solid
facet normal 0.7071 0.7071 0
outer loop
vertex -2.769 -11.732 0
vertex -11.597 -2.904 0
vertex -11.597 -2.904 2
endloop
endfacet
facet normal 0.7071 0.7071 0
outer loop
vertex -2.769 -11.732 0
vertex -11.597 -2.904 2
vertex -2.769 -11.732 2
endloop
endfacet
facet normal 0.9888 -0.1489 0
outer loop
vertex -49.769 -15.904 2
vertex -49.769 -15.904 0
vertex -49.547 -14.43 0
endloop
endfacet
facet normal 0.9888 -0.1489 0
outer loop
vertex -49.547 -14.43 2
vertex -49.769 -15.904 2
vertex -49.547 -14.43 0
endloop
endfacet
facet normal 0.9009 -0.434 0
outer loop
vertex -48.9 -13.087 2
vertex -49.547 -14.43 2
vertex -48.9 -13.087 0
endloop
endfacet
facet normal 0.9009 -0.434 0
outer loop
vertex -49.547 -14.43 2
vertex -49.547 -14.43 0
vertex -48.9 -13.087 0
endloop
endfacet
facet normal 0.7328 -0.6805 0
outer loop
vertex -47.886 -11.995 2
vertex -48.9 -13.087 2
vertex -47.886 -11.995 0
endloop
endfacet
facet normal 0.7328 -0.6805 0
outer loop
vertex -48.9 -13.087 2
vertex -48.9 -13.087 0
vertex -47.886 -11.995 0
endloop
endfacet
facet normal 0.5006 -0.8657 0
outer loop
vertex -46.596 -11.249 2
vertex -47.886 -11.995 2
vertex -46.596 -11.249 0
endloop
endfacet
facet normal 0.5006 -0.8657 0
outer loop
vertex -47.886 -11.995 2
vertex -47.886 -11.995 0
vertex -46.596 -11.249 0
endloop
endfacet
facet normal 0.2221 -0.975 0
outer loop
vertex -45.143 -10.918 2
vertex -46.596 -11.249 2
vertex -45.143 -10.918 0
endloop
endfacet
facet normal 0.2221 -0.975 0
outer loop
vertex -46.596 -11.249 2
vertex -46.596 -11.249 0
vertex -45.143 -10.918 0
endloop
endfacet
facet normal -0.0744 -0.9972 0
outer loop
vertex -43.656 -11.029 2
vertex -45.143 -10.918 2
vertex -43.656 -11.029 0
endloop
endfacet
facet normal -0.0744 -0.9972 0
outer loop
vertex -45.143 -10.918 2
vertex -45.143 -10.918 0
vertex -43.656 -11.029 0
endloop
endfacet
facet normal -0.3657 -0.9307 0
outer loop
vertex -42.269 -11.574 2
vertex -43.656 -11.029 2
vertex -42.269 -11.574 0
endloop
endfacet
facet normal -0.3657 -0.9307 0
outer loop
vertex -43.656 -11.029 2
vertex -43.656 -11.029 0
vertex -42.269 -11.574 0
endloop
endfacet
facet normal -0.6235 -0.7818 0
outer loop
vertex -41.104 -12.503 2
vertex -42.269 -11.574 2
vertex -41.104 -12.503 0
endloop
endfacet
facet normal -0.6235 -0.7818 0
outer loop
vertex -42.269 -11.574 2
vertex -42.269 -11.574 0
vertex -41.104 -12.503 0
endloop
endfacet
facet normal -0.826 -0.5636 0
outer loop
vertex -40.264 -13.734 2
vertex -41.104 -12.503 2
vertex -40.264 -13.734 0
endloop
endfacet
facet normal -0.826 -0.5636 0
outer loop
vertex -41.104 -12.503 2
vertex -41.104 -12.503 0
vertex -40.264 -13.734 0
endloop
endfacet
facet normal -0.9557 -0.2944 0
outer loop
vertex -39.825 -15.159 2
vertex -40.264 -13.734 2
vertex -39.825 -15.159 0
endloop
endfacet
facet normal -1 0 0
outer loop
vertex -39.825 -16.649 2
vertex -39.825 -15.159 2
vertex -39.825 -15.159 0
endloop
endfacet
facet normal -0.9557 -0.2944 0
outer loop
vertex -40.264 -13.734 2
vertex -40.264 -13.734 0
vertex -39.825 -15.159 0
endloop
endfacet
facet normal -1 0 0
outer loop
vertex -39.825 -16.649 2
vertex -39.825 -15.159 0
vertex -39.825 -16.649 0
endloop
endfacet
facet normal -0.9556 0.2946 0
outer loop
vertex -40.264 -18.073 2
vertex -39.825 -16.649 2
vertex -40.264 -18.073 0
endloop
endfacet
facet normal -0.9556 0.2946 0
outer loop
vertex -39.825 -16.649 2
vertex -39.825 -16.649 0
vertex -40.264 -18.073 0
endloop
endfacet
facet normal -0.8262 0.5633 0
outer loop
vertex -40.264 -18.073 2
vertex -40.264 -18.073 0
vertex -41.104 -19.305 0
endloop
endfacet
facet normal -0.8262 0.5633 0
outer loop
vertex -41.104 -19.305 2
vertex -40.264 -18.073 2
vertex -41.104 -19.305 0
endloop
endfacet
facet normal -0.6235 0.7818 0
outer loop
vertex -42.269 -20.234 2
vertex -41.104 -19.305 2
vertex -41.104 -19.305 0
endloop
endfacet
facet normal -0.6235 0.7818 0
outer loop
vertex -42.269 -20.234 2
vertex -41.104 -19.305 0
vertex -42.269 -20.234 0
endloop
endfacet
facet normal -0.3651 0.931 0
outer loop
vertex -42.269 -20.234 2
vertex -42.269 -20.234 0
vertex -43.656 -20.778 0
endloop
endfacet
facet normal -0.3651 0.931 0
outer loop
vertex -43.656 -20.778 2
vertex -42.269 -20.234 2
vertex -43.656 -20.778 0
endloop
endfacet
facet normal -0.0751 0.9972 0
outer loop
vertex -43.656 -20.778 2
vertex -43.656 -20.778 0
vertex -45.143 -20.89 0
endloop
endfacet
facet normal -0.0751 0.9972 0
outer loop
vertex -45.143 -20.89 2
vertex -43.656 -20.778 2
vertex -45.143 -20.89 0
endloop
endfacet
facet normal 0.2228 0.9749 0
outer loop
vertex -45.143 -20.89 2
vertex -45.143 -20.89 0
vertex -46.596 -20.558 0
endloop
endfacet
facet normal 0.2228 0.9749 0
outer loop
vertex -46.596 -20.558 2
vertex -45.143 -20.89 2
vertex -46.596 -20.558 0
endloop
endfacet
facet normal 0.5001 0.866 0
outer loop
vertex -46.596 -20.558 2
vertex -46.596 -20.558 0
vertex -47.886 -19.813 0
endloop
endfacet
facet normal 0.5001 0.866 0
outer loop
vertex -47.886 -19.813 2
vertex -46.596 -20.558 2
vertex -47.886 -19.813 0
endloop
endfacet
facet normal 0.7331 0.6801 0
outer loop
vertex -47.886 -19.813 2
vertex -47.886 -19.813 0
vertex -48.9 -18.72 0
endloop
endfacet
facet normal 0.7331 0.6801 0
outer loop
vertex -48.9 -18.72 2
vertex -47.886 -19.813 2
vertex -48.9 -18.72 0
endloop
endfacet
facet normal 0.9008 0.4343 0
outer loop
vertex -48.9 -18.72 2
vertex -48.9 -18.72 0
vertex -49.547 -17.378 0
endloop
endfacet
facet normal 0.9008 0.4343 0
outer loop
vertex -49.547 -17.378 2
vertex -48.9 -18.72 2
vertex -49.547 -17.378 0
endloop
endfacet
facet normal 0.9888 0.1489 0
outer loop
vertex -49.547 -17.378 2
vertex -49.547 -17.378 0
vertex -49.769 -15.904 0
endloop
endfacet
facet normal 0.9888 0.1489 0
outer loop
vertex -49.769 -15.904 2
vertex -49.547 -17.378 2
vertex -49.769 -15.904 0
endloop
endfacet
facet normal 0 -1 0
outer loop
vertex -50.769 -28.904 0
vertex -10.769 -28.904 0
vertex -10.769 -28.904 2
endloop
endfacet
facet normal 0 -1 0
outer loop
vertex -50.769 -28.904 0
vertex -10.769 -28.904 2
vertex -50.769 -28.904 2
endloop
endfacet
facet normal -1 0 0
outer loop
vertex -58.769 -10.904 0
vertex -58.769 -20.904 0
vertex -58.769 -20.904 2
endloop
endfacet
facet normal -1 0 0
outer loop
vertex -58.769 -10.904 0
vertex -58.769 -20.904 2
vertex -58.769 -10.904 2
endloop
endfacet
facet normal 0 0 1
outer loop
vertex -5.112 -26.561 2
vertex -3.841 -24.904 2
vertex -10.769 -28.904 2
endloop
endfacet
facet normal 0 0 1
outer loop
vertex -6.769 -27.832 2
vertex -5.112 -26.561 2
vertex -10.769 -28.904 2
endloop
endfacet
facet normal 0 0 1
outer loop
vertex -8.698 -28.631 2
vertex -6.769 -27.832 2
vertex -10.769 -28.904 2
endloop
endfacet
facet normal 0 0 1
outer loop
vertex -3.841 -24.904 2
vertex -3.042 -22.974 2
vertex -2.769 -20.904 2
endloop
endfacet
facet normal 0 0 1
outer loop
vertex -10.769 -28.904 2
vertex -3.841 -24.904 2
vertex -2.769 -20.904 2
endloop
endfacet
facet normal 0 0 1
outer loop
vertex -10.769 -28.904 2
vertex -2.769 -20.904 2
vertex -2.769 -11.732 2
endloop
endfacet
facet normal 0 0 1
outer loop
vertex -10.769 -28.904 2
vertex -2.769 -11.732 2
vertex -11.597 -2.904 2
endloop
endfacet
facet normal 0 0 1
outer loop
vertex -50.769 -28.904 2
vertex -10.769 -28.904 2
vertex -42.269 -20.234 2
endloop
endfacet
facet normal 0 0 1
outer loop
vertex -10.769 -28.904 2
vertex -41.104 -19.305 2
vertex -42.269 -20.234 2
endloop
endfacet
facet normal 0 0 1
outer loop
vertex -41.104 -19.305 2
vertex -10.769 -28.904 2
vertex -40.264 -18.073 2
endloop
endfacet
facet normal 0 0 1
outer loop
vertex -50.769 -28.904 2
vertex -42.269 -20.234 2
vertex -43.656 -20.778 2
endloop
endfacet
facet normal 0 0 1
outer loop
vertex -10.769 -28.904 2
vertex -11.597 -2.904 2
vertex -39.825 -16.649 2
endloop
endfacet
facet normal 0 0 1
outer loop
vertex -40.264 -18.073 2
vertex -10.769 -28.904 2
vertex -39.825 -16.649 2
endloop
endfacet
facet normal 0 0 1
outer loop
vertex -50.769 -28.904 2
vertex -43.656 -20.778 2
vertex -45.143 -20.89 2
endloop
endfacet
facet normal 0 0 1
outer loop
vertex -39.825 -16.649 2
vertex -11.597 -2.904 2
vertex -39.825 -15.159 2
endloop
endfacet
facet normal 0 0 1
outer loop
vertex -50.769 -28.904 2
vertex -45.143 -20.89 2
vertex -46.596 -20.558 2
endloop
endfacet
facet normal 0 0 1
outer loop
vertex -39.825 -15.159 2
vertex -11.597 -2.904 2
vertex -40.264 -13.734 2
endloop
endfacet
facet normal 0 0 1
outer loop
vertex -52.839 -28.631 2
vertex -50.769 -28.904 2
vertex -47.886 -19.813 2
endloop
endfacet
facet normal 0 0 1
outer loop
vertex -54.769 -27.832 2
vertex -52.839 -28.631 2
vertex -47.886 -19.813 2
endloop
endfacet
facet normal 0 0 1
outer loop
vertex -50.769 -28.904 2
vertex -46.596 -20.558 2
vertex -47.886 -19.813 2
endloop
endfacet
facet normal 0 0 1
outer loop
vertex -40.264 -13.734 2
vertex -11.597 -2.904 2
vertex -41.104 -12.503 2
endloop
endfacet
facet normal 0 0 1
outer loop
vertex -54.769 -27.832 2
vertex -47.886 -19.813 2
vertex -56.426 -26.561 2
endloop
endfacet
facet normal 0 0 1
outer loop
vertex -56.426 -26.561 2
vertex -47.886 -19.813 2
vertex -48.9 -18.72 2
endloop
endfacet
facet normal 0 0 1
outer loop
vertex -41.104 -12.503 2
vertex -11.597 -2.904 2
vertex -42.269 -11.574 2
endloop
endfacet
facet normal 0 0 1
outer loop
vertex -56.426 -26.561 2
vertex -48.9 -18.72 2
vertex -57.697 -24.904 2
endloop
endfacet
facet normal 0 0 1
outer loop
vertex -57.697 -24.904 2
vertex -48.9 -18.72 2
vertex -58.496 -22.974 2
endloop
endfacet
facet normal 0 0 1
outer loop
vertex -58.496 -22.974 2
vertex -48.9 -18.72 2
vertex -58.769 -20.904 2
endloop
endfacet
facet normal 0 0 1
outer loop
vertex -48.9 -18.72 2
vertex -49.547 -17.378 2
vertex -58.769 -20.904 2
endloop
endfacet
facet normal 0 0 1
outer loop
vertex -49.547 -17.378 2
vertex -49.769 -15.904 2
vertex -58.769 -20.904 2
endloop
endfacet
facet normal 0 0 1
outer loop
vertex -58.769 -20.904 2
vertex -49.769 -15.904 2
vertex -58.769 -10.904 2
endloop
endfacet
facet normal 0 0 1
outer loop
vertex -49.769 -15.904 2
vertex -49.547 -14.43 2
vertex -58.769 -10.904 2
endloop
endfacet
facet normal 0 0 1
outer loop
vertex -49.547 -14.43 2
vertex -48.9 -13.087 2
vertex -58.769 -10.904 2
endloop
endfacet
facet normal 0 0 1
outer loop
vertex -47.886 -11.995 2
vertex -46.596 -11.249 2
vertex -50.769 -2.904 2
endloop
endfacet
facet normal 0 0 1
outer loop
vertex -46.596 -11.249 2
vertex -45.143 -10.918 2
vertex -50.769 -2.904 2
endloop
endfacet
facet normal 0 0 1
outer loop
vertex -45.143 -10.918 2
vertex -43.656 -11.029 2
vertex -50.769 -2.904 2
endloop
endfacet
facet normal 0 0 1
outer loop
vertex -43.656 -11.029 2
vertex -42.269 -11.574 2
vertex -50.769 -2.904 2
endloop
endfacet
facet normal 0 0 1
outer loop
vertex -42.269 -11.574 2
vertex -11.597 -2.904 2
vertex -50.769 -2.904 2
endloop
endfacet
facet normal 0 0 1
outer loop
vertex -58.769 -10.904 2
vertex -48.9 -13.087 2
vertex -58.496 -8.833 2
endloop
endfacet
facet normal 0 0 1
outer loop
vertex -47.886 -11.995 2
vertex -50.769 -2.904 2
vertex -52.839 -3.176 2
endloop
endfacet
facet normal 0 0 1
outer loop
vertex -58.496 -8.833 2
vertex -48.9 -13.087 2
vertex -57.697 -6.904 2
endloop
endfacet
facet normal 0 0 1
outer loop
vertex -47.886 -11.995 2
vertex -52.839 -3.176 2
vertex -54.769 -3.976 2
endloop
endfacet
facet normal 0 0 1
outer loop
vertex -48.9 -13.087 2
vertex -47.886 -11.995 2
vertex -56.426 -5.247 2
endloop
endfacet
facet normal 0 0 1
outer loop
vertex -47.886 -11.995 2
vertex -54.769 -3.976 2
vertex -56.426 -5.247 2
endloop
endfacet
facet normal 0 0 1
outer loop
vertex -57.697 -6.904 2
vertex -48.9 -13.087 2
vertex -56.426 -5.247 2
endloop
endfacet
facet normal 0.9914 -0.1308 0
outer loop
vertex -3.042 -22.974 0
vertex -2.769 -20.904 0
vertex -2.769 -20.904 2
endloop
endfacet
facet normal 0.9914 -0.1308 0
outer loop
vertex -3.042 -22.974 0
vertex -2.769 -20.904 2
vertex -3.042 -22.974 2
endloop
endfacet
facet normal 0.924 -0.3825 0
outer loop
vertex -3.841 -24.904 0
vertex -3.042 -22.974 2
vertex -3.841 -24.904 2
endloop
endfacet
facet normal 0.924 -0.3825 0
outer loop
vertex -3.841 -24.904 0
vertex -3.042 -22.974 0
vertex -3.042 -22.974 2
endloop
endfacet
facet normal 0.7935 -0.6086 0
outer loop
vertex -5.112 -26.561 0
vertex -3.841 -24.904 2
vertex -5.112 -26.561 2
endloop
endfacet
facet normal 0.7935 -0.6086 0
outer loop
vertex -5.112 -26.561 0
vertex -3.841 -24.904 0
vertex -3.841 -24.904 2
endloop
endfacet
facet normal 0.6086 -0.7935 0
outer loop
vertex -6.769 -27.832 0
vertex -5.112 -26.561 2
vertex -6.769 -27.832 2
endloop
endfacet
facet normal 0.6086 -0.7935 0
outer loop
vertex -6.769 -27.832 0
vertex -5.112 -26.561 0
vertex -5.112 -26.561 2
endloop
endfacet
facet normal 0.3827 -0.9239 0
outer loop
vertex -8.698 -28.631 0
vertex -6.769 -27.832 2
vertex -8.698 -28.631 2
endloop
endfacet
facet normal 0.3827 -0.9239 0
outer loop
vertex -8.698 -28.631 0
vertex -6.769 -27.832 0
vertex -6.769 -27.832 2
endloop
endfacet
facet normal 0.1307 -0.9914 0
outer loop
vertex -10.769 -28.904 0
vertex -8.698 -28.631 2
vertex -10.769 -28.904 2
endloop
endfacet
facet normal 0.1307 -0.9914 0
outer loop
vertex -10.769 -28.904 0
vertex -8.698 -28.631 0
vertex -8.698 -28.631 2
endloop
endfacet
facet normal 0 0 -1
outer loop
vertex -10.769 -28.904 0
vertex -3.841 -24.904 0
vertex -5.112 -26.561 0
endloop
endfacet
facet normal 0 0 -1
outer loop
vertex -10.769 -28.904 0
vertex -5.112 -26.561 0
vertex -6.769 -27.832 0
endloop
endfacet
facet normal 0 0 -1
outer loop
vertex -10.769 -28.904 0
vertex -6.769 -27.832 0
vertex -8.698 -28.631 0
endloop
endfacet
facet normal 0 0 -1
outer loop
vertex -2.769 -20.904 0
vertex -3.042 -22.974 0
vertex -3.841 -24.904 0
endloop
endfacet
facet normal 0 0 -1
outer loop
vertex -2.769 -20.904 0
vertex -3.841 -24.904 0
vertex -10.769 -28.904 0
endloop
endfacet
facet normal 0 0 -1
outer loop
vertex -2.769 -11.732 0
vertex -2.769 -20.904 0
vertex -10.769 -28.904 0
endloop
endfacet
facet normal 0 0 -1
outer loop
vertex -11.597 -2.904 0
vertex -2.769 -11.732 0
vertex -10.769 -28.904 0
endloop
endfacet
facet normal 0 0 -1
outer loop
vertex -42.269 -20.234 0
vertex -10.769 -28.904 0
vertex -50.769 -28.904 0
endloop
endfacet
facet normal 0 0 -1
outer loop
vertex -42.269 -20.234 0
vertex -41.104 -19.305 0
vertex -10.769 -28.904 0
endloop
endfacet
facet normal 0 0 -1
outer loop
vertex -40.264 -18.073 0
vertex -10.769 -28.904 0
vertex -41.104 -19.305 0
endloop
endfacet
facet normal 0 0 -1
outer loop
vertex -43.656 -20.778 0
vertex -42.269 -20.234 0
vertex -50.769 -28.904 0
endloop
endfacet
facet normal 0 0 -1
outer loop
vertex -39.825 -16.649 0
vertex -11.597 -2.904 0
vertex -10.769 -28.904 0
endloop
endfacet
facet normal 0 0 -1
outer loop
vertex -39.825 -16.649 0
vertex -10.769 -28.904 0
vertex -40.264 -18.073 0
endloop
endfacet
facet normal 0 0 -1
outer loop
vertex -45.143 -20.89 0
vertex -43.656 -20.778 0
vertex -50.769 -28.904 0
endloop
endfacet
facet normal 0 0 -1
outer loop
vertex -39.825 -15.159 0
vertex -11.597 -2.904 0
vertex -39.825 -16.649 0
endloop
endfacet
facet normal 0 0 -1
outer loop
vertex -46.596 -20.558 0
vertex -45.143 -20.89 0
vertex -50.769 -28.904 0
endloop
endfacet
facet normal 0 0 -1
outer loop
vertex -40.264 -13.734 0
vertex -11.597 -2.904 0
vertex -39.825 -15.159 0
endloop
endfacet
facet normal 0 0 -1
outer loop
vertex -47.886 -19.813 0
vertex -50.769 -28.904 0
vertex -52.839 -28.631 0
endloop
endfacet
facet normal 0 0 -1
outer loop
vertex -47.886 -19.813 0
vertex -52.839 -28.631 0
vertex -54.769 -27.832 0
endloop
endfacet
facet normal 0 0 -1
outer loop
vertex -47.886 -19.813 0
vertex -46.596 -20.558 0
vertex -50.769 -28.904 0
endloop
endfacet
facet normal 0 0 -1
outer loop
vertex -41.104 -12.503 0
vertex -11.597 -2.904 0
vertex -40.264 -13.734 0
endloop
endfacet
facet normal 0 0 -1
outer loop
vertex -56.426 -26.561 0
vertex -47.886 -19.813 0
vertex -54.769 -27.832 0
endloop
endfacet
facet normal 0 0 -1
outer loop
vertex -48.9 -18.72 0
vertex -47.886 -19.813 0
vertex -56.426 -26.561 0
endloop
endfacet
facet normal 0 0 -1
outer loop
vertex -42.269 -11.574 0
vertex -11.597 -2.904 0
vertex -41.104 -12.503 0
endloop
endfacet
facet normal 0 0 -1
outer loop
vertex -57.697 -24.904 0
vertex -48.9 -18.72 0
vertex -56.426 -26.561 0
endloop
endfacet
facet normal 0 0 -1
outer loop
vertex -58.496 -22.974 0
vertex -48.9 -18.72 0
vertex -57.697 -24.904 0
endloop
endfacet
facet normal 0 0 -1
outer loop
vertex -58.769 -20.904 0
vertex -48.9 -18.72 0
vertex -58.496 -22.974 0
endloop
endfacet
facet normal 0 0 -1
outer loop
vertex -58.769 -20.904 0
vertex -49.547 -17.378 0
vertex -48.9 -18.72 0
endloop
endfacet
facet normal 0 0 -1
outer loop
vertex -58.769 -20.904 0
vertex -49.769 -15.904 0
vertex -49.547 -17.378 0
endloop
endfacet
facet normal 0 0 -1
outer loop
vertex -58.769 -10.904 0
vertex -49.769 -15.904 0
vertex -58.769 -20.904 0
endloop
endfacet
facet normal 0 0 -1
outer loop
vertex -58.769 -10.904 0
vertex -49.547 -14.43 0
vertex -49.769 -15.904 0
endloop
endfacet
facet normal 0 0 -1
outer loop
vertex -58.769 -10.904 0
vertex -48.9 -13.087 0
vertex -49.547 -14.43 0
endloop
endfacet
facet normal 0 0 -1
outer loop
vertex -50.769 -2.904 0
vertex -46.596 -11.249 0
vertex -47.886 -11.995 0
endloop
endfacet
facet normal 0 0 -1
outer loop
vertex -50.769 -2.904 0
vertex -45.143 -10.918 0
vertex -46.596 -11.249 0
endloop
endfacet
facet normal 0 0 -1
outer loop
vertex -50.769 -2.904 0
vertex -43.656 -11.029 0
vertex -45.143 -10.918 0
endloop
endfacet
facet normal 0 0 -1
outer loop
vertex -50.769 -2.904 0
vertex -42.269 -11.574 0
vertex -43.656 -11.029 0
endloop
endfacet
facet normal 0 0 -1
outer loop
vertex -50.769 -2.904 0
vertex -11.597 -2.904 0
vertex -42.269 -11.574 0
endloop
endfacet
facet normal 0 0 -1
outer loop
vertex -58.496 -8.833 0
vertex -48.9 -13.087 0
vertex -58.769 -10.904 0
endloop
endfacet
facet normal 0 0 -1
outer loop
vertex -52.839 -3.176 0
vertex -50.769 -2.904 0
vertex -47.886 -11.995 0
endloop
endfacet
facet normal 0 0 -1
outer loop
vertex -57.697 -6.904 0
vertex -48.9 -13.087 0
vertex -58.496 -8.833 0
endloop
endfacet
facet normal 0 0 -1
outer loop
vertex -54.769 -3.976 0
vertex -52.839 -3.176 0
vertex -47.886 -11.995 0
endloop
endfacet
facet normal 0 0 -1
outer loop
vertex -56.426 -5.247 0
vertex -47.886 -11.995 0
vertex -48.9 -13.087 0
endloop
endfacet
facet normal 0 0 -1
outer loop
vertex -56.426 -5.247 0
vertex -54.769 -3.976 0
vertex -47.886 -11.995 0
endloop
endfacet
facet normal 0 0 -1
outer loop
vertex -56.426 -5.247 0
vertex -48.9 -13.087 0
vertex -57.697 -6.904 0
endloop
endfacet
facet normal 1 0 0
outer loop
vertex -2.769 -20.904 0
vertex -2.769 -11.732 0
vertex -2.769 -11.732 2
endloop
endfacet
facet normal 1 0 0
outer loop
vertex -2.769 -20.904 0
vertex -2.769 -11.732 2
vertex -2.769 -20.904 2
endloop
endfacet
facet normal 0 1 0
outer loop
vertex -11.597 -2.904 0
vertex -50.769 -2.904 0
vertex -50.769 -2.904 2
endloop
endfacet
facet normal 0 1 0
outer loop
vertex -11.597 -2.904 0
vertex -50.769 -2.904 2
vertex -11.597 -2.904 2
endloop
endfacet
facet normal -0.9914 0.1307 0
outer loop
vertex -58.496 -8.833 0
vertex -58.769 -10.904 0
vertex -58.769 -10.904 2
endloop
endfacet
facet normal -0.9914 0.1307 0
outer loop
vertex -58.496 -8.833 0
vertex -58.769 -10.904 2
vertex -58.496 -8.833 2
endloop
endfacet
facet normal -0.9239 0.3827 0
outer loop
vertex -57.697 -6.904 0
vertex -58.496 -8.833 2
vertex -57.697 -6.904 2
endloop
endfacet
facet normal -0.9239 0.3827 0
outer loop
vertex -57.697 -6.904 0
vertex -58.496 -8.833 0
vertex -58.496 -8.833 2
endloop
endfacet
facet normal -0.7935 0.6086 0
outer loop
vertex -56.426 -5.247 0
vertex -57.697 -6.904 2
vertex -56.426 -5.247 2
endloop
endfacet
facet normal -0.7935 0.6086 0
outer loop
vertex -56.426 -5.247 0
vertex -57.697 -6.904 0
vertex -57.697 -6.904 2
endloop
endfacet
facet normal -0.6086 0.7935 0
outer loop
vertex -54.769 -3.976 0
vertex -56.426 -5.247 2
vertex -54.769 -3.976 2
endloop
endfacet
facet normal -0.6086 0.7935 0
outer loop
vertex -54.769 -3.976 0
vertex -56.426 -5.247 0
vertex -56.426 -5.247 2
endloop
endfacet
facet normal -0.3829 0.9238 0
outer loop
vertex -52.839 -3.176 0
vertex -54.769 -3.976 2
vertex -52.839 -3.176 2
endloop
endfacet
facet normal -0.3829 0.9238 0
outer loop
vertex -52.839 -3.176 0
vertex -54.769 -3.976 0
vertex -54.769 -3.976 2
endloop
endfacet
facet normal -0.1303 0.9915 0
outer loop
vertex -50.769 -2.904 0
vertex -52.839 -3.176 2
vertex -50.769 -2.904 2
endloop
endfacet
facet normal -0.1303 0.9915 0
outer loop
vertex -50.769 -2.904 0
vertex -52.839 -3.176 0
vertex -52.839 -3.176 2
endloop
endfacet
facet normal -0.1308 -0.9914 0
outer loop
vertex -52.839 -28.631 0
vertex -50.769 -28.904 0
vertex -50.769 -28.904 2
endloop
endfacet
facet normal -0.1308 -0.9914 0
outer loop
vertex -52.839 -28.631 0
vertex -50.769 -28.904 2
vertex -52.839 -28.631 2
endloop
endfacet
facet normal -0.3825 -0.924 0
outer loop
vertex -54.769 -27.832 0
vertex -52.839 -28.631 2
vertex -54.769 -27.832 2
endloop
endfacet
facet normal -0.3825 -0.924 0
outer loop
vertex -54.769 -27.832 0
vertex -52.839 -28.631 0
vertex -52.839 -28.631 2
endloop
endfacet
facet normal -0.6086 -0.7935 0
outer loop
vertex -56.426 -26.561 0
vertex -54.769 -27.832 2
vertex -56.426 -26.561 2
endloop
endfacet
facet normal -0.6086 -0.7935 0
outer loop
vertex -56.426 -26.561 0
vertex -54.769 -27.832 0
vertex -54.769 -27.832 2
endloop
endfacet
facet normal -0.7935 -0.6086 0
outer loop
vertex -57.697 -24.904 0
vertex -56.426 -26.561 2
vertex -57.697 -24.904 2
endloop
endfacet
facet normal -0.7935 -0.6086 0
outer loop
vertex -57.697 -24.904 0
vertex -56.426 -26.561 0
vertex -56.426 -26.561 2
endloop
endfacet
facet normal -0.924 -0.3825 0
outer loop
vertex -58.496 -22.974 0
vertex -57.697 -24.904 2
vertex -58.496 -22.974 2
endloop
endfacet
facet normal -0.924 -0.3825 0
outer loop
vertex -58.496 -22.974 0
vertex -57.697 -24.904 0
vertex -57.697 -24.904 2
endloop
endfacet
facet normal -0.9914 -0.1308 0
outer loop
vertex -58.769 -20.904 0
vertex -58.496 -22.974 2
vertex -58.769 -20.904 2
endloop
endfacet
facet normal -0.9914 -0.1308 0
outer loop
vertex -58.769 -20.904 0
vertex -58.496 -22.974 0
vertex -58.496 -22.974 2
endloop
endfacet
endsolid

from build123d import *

# Parameters (mm, degrees)
BOSS_EXTRUDE1_DEPTH = 2
SKETCH2_R           = 5
CUT_EXTRUDE1_DEPTH  = 4.1


with BuildPart() as part:
    # Sketch1 → Boss-Extrude1 (new body)
    with BuildSketch(Plane.XY):
        with BuildLine():
            Line((-50.768947103, -2.903737712), (-11.597374228, -2.903737712))
            Line((-11.597374228, -2.903737712), (-2.768947103, -11.732164837))
            Line((-2.768947103, -11.732164837), (-2.768947103, -20.903737712))
            ThreePointArc((-2.768947103, -20.903737712), (-5.112092854, -26.560591962), (-10.768947103, -28.903737712))
            Line((-10.768947103, -28.903737712), (-50.768947103, -28.903737712))
            ThreePointArc((-50.768947103, -28.903737712), (-56.425801353, -26.560591962), (-58.768947103, -20.903737712))
            Line((-58.768947103, -20.903737712), (-58.768947103, -10.903737712))
            ThreePointArc((-58.768947103, -10.903737712), (-56.425801353, -5.246883463), (-50.768947103, -2.903737712))
        make_face()
    extrude(amount=BOSS_EXTRUDE1_DEPTH)

    # Sketch2 → Cut-Extrude1 (cut)
    with BuildSketch(Plane(origin=(0, 0, 0), x_dir=(-1, 0, 0), z_dir=(0, 0, -1))):
        with Locations((44.768947103, -15.903737712)):
            Circle(SKETCH2_R)
    extrude(amount=-CUT_EXTRUDE1_DEPTH, mode=Mode.SUBTRACT)


solid = part.part
